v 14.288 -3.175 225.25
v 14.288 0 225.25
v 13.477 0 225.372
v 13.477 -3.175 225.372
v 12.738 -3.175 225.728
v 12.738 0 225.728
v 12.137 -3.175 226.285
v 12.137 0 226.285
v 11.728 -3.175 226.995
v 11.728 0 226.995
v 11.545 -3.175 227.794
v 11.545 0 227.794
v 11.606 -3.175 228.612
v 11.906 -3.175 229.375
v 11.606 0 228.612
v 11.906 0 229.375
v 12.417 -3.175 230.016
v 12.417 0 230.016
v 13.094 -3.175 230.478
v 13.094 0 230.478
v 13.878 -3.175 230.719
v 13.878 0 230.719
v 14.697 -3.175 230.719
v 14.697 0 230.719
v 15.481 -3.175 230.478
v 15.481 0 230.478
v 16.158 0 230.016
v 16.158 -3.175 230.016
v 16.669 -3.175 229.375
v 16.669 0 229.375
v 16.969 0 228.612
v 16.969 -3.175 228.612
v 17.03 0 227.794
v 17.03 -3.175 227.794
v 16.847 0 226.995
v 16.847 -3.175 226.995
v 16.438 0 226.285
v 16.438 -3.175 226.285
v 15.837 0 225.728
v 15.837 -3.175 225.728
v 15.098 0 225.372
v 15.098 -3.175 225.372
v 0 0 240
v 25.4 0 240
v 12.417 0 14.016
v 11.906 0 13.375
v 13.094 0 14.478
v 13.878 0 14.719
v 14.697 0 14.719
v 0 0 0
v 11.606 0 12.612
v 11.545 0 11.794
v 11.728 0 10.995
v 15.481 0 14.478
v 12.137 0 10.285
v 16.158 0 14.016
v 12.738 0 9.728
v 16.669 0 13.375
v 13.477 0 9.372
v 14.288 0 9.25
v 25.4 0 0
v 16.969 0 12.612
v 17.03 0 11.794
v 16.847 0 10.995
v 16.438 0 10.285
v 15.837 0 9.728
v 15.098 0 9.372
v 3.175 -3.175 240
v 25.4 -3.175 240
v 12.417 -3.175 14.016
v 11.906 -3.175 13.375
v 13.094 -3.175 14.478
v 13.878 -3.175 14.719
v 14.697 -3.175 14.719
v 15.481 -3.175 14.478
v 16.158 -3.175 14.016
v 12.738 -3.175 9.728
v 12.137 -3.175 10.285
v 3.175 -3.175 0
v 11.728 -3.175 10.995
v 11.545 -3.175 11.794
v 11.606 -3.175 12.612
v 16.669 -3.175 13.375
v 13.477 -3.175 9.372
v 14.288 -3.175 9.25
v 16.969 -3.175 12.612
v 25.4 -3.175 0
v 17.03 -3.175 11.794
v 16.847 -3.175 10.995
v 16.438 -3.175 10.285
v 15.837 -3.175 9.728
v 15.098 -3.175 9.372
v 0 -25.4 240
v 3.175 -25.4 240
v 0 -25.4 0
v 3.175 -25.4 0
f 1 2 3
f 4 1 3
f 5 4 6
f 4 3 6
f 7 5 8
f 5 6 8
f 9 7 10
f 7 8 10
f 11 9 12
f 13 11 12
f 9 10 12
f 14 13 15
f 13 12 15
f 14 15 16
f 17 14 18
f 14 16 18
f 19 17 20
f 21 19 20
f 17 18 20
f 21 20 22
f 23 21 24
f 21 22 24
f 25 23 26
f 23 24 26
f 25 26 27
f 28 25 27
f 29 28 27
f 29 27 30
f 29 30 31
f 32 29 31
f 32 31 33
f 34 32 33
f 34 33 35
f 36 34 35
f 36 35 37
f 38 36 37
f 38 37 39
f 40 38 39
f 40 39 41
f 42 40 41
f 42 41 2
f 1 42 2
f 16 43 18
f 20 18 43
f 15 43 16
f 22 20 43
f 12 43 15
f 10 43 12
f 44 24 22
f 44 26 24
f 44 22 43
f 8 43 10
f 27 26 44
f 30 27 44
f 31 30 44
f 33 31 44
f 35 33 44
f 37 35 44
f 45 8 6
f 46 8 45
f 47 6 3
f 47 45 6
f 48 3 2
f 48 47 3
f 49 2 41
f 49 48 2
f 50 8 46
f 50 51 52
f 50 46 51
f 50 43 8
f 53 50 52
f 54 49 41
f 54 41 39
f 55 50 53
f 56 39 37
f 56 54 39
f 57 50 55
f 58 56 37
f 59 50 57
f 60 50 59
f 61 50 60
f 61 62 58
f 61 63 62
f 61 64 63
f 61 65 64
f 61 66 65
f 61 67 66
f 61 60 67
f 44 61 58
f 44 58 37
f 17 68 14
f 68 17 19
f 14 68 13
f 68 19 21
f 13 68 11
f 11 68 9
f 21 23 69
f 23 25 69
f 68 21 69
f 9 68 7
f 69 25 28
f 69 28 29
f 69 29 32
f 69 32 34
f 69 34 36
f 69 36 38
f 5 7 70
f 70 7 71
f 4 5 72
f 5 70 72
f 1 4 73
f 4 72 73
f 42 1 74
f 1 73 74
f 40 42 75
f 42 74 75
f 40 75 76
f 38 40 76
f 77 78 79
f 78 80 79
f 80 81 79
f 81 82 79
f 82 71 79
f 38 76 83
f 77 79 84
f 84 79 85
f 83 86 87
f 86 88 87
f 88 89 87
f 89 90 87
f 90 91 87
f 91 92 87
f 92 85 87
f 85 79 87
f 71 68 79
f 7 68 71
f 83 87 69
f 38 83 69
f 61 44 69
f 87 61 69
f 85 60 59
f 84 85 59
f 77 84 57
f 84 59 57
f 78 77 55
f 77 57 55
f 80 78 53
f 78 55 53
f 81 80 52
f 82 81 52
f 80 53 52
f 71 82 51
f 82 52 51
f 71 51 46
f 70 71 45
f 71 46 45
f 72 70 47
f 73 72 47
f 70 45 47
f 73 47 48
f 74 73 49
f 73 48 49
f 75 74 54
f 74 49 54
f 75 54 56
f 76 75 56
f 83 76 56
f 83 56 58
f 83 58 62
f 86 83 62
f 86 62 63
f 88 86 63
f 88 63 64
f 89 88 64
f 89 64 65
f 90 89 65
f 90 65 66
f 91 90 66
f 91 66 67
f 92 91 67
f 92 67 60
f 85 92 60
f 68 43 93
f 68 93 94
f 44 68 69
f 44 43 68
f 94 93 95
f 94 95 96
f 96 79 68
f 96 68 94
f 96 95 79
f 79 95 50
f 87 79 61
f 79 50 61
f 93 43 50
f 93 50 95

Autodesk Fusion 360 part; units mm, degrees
sketch "Sketch1" plane through (0, 0, 0) normal (0, 0, 1) x (1, 0, 0)
  line L0 (0, 0) -> (25.4, 0)
  line L1 (0, 0) -> (0, -25.4)
  line L2 (3.175, -3.175) -> (25.4, -3.175)
  line L3 (3.175, -3.175) -> (3.175, -25.4)
  line L4 (25.4, 0) -> (25.4, -3.175)
  line L5 (0, -25.4) -> (3.175, -25.4)
  dimension "d1" = 25.4
  dimension "d2" = -3.175
extrude "Extrude1" add sketch "Sketch1" along normal blind 240
sketch "Sketch2" plane through (0, -3.175, 0) normal (0, -1, 0) x (1, 0, 0)
  line L0 (3.175, 0) -> (25.4, 0)
  line L1 (25.4, 0) -> (25.4, 240)
  line L2 (25.4, 240) -> (3.175, 240)
  line L3 (3.175, 240) -> (3.175, 0)
  circle A0 centre (14.2875, 228) radius 2.75
  circle A1 centre (14.2875, 12) radius 2.75
  line L4 (14.2875, 240) -> (14.2875, 0) construction
  dimension "d5" = 5.5
  dimension "d6" = 12
  dimension "d7" = 12
hole "Hole1" at (14.2875, -3.175, 12) at (14.2875, -3.175, 228) direction (0, 1, 0) diameter 5.5 depth 7 tip angle 118
